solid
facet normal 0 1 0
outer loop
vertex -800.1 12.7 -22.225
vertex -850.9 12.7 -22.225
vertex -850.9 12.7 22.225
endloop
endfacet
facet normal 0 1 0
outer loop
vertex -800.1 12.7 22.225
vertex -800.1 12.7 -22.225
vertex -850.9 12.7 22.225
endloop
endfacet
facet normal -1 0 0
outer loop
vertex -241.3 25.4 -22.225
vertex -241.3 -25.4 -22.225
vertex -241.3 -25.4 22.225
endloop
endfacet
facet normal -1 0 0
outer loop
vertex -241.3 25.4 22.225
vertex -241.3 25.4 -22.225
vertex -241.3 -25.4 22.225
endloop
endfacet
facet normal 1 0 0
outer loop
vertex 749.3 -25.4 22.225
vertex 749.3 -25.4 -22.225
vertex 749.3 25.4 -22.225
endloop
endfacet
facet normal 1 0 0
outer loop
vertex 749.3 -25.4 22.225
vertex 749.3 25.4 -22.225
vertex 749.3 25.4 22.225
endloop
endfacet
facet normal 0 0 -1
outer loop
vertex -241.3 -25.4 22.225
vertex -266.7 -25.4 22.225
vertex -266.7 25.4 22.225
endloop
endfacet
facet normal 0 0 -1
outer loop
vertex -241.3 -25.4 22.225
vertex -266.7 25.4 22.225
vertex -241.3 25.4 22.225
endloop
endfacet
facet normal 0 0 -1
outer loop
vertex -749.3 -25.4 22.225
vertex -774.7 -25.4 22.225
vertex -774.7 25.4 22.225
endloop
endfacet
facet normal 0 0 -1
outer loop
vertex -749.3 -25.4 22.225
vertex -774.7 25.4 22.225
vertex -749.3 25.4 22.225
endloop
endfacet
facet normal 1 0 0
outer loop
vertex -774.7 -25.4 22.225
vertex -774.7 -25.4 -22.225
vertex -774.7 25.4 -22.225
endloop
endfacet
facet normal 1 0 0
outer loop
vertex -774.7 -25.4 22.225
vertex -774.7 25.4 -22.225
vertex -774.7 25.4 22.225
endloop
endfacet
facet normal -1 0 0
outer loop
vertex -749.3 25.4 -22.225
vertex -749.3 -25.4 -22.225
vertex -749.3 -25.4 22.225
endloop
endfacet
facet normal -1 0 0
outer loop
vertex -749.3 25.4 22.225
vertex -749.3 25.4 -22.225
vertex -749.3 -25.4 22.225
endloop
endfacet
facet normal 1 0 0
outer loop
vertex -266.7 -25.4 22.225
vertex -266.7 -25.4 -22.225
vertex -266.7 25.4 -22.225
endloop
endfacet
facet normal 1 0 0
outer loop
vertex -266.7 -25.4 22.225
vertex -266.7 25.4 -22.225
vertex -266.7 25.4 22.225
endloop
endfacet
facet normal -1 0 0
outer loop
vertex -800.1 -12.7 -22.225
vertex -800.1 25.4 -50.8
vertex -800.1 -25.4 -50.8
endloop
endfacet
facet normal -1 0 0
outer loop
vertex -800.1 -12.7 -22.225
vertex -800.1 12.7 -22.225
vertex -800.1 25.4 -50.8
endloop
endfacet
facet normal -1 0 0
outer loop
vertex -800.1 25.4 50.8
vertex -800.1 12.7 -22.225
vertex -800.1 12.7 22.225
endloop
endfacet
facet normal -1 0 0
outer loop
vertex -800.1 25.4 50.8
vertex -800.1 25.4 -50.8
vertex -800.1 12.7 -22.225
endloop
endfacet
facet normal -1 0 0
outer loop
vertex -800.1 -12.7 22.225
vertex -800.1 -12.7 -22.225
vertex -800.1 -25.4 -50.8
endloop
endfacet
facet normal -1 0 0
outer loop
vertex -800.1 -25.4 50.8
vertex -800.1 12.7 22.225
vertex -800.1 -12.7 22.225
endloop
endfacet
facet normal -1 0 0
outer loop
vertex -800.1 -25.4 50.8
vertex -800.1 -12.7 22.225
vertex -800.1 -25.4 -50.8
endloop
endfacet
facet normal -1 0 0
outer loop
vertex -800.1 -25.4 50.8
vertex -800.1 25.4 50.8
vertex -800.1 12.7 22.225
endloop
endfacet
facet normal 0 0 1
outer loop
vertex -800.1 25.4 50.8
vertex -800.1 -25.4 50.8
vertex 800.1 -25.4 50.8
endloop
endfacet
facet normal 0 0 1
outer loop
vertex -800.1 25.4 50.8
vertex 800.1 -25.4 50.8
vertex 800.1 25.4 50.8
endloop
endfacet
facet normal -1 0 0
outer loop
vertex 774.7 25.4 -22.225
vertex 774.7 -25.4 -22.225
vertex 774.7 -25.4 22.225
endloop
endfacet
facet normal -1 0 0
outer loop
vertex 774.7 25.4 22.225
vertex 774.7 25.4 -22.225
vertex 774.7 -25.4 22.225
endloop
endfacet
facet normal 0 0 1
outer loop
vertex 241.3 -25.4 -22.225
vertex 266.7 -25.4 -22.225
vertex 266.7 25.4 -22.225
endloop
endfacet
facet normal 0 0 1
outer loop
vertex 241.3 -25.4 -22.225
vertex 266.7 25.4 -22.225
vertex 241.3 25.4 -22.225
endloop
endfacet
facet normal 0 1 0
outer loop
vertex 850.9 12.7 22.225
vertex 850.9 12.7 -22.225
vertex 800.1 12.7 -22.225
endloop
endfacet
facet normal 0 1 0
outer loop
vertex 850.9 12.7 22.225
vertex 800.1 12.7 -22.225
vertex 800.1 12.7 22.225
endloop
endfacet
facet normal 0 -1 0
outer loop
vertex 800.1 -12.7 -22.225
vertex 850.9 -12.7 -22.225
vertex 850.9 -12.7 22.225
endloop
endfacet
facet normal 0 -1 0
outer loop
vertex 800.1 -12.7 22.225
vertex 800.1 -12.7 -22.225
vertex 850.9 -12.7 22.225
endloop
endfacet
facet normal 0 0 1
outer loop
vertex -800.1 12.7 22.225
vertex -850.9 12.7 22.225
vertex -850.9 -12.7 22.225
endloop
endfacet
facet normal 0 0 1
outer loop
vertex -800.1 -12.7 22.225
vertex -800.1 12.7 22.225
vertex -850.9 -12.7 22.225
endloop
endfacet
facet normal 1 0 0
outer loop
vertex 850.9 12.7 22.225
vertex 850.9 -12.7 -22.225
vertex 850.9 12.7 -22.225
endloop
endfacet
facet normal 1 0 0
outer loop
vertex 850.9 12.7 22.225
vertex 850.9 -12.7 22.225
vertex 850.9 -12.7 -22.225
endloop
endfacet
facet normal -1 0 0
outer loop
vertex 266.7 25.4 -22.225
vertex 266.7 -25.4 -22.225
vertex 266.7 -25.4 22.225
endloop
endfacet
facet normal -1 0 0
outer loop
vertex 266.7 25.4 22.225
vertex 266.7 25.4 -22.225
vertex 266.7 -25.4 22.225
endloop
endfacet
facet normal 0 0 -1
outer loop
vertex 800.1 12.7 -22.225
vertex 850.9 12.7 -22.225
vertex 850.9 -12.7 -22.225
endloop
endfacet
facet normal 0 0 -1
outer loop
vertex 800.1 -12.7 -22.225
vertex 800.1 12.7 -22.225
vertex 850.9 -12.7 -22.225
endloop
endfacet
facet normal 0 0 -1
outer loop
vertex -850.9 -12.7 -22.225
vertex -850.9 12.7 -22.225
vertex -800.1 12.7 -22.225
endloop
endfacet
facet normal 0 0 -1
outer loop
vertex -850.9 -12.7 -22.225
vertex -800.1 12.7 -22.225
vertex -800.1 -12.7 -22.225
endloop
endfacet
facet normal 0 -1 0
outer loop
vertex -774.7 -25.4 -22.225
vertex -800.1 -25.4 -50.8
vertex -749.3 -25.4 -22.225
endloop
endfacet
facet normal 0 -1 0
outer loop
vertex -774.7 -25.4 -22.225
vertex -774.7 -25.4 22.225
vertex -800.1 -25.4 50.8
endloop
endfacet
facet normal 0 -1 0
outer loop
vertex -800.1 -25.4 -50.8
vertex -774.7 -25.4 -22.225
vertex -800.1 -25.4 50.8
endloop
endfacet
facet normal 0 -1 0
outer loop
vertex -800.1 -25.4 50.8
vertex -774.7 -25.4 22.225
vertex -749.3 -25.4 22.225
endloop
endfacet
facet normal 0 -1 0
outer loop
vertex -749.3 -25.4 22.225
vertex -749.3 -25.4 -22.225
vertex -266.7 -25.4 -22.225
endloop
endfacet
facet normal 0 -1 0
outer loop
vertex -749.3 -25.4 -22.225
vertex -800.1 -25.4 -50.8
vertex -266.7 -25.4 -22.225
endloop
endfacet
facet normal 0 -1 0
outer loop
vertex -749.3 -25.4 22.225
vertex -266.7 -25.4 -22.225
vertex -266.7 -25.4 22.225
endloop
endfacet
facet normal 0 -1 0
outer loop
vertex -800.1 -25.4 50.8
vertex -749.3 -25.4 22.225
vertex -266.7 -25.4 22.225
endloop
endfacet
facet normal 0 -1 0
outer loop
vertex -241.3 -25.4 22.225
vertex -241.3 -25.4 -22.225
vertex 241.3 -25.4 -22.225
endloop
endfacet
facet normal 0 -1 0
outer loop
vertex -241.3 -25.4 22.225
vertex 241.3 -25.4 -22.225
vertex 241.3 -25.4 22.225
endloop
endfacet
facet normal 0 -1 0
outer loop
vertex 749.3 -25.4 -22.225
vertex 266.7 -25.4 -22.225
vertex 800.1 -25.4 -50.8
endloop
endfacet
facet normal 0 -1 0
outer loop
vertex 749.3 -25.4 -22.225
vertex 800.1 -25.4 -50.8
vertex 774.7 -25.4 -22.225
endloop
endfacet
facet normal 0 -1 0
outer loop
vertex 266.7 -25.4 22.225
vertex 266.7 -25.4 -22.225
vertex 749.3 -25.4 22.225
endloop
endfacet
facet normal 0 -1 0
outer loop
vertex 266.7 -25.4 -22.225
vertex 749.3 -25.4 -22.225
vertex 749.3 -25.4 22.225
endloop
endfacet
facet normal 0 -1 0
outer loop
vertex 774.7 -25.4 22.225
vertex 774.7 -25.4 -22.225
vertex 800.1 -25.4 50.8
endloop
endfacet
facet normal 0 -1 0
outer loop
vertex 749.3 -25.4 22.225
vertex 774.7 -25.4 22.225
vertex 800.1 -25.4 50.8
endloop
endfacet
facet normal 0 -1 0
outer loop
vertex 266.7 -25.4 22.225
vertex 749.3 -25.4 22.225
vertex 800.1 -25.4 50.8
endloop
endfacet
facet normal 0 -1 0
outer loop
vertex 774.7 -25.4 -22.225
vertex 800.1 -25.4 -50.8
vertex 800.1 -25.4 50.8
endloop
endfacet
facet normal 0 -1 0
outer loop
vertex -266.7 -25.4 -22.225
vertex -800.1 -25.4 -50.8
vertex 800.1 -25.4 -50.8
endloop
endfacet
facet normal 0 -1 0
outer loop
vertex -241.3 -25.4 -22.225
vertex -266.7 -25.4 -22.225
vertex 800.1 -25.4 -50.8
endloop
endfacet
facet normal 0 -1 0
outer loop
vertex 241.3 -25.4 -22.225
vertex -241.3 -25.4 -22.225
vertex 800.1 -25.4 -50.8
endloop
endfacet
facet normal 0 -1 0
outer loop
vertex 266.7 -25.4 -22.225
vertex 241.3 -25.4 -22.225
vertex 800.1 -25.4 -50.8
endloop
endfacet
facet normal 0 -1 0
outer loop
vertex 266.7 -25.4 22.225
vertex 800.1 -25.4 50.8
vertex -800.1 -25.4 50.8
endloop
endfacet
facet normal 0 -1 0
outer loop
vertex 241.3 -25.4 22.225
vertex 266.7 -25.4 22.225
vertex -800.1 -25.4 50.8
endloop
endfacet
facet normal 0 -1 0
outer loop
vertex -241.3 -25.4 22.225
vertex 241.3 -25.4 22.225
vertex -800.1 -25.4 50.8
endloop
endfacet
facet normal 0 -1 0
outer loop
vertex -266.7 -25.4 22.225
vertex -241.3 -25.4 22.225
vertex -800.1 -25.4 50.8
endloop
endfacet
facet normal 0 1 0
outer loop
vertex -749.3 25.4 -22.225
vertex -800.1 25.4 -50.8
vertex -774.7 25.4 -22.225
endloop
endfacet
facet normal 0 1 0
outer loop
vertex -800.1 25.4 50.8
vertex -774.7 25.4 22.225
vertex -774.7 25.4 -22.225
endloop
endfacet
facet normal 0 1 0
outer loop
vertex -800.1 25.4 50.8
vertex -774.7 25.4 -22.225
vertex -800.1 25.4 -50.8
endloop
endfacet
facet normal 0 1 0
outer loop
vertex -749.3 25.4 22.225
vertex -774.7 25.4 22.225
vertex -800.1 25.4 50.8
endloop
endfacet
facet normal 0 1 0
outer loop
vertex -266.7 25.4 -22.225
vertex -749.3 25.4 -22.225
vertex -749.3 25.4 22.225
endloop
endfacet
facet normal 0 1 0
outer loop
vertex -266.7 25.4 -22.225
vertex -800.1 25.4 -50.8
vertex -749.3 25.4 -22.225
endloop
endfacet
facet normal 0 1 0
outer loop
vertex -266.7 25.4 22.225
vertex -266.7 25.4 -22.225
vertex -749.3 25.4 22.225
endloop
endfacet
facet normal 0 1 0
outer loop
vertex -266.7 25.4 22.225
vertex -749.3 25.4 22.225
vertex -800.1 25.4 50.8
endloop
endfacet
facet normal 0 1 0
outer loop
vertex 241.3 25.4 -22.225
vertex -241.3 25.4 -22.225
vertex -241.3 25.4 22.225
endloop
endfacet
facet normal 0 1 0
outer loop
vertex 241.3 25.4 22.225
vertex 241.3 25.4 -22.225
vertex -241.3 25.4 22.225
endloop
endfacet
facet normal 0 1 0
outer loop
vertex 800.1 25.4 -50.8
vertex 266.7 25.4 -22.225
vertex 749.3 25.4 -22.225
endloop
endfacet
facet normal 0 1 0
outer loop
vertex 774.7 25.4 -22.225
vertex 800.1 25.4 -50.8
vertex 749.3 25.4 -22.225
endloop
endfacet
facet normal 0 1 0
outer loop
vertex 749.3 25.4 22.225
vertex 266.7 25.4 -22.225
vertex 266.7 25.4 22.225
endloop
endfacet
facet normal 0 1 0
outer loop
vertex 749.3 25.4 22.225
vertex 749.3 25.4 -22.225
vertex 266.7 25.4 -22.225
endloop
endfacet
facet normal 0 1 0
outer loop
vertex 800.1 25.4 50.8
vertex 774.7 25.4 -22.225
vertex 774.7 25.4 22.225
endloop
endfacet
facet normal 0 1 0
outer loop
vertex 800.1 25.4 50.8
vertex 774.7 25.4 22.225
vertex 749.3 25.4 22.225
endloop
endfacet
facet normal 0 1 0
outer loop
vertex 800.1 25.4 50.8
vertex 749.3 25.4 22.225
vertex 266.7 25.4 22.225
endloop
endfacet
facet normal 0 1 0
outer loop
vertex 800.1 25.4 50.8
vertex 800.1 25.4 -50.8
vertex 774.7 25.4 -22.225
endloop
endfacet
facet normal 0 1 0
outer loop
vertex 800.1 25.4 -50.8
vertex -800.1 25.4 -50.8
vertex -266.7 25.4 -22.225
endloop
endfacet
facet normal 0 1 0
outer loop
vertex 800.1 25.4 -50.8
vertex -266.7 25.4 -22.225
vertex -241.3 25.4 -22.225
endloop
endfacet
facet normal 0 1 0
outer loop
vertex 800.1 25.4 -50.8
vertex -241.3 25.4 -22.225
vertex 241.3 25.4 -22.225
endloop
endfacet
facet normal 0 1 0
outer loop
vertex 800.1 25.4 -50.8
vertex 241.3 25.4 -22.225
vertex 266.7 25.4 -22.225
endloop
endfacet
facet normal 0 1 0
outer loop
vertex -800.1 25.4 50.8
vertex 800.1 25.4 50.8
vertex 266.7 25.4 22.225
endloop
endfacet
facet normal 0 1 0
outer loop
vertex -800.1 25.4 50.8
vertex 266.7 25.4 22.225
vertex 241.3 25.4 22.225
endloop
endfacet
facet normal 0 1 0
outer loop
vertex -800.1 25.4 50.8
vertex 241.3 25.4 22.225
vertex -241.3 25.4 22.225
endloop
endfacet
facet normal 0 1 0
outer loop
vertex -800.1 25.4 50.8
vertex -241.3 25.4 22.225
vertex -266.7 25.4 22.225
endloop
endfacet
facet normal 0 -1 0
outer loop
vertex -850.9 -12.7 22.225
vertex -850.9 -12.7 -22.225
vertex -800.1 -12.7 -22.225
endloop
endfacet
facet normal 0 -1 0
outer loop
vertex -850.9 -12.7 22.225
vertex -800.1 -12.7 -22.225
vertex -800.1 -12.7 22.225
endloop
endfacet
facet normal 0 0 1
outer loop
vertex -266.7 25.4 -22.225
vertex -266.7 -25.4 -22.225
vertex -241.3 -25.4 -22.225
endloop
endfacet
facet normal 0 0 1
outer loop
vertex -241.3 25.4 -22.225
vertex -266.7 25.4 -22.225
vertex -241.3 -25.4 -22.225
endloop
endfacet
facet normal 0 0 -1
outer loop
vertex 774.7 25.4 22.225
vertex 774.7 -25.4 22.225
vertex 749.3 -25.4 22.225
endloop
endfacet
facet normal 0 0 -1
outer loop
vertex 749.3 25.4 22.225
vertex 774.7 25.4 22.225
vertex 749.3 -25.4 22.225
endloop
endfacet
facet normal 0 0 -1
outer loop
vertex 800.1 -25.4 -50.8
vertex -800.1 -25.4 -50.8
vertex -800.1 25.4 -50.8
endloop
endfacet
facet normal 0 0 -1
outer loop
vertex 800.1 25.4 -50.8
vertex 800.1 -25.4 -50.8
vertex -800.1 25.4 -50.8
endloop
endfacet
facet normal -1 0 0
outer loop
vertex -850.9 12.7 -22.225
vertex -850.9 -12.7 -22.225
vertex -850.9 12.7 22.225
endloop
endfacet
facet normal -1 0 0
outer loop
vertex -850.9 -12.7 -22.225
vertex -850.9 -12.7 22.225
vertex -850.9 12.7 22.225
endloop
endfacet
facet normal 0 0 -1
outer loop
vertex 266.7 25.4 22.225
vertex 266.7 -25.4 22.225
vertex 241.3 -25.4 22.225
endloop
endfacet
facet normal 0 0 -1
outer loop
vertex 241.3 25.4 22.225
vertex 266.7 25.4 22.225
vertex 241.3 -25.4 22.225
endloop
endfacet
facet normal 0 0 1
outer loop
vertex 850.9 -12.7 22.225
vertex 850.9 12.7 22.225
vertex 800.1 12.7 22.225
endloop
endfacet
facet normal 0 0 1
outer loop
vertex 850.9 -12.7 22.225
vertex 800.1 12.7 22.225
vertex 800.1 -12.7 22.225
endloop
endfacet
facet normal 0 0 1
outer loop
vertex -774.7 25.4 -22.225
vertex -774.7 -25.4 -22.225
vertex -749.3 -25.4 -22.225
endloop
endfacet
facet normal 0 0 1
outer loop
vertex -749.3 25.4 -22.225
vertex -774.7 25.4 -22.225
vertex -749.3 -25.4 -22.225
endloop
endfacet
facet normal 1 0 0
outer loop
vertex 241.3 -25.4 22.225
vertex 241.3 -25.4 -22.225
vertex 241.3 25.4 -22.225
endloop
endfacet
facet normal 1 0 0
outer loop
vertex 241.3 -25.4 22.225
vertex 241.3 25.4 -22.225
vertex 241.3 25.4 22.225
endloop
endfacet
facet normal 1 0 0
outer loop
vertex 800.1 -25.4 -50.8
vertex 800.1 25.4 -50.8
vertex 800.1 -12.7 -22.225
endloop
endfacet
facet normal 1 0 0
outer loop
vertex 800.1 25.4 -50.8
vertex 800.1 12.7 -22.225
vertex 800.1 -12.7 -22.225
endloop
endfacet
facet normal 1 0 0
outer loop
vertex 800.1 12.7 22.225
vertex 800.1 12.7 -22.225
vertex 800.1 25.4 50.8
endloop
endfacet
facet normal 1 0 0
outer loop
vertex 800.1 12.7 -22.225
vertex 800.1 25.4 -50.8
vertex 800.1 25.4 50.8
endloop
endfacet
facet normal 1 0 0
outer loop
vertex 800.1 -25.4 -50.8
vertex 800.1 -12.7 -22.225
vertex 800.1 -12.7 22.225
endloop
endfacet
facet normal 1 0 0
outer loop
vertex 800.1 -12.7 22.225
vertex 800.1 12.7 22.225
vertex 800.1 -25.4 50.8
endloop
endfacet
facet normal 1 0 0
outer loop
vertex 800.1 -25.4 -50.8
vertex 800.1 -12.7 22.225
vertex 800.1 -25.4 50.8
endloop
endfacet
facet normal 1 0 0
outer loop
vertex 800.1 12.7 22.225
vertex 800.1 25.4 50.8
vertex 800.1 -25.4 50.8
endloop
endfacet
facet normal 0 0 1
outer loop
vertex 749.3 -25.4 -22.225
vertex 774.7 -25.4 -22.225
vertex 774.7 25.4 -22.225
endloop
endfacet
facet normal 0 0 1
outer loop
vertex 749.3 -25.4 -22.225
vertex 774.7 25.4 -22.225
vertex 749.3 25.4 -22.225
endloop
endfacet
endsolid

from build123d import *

# Parameters (mm, degrees)
F0_W     = 50.8
F0_H     = 101.6
F1_DEPTH = 850.9
F2_W     = 50.8
F2_H     = 101.6
F2_W_2   = 25.4
F2_H_2   = 44.45
F3_DEPTH = 50.8
F4_W     = 25.4
F4_H     = 44.45
F5_DEPTH = 50.801


# Not quite as in the source:
# - a pattern or mirror of a feature is missing from the dataset's text; its kind, count and spacing are read off the source's solid


with BuildPart() as f1:
    # F0 (on Right) → F1 (new body, symmetric)
    with BuildSketch(Plane.YZ):
        Rectangle(F0_W, F0_H)
    extrude(amount=F1_DEPTH, both=True)

    # F2 (on face) → F3 (cut)
    with BuildSketch(Plane(origin=(-850.9, 0, 0), x_dir=(0, -1, 0), z_dir=(-1, 0, 0))):
        Rectangle(F2_W, F2_H)
        Rectangle(F2_W_2, F2_H_2, mode=Mode.SUBTRACT)
    f3 = extrude(amount=-F3_DEPTH, mode=Mode.SUBTRACT)

    # F3_copies: F3 across plane
    add(f3.mirror(Plane(origin=(0, 0, 0), x_dir=(0, 0, 1), z_dir=(1, 0, 0))), mode=Mode.SUBTRACT)

    # F4 (on face) → F5 (cut, through all)
    with BuildSketch(Plane.XZ.offset(25.4)):
        with Locations((-762, 0)):
            Rectangle(F4_W, F4_H)
        with Locations((-254, 0)):
            Rectangle(F4_W, F4_H)
    f5 = extrude(amount=-F5_DEPTH, mode=Mode.SUBTRACT)

    # F5_copies: F5 across plane
    add(f5.mirror(Plane(origin=(0, 0, 0), x_dir=(0, 0, 1), z_dir=(1, 0, 0))), mode=Mode.SUBTRACT)


solid = f1.part
